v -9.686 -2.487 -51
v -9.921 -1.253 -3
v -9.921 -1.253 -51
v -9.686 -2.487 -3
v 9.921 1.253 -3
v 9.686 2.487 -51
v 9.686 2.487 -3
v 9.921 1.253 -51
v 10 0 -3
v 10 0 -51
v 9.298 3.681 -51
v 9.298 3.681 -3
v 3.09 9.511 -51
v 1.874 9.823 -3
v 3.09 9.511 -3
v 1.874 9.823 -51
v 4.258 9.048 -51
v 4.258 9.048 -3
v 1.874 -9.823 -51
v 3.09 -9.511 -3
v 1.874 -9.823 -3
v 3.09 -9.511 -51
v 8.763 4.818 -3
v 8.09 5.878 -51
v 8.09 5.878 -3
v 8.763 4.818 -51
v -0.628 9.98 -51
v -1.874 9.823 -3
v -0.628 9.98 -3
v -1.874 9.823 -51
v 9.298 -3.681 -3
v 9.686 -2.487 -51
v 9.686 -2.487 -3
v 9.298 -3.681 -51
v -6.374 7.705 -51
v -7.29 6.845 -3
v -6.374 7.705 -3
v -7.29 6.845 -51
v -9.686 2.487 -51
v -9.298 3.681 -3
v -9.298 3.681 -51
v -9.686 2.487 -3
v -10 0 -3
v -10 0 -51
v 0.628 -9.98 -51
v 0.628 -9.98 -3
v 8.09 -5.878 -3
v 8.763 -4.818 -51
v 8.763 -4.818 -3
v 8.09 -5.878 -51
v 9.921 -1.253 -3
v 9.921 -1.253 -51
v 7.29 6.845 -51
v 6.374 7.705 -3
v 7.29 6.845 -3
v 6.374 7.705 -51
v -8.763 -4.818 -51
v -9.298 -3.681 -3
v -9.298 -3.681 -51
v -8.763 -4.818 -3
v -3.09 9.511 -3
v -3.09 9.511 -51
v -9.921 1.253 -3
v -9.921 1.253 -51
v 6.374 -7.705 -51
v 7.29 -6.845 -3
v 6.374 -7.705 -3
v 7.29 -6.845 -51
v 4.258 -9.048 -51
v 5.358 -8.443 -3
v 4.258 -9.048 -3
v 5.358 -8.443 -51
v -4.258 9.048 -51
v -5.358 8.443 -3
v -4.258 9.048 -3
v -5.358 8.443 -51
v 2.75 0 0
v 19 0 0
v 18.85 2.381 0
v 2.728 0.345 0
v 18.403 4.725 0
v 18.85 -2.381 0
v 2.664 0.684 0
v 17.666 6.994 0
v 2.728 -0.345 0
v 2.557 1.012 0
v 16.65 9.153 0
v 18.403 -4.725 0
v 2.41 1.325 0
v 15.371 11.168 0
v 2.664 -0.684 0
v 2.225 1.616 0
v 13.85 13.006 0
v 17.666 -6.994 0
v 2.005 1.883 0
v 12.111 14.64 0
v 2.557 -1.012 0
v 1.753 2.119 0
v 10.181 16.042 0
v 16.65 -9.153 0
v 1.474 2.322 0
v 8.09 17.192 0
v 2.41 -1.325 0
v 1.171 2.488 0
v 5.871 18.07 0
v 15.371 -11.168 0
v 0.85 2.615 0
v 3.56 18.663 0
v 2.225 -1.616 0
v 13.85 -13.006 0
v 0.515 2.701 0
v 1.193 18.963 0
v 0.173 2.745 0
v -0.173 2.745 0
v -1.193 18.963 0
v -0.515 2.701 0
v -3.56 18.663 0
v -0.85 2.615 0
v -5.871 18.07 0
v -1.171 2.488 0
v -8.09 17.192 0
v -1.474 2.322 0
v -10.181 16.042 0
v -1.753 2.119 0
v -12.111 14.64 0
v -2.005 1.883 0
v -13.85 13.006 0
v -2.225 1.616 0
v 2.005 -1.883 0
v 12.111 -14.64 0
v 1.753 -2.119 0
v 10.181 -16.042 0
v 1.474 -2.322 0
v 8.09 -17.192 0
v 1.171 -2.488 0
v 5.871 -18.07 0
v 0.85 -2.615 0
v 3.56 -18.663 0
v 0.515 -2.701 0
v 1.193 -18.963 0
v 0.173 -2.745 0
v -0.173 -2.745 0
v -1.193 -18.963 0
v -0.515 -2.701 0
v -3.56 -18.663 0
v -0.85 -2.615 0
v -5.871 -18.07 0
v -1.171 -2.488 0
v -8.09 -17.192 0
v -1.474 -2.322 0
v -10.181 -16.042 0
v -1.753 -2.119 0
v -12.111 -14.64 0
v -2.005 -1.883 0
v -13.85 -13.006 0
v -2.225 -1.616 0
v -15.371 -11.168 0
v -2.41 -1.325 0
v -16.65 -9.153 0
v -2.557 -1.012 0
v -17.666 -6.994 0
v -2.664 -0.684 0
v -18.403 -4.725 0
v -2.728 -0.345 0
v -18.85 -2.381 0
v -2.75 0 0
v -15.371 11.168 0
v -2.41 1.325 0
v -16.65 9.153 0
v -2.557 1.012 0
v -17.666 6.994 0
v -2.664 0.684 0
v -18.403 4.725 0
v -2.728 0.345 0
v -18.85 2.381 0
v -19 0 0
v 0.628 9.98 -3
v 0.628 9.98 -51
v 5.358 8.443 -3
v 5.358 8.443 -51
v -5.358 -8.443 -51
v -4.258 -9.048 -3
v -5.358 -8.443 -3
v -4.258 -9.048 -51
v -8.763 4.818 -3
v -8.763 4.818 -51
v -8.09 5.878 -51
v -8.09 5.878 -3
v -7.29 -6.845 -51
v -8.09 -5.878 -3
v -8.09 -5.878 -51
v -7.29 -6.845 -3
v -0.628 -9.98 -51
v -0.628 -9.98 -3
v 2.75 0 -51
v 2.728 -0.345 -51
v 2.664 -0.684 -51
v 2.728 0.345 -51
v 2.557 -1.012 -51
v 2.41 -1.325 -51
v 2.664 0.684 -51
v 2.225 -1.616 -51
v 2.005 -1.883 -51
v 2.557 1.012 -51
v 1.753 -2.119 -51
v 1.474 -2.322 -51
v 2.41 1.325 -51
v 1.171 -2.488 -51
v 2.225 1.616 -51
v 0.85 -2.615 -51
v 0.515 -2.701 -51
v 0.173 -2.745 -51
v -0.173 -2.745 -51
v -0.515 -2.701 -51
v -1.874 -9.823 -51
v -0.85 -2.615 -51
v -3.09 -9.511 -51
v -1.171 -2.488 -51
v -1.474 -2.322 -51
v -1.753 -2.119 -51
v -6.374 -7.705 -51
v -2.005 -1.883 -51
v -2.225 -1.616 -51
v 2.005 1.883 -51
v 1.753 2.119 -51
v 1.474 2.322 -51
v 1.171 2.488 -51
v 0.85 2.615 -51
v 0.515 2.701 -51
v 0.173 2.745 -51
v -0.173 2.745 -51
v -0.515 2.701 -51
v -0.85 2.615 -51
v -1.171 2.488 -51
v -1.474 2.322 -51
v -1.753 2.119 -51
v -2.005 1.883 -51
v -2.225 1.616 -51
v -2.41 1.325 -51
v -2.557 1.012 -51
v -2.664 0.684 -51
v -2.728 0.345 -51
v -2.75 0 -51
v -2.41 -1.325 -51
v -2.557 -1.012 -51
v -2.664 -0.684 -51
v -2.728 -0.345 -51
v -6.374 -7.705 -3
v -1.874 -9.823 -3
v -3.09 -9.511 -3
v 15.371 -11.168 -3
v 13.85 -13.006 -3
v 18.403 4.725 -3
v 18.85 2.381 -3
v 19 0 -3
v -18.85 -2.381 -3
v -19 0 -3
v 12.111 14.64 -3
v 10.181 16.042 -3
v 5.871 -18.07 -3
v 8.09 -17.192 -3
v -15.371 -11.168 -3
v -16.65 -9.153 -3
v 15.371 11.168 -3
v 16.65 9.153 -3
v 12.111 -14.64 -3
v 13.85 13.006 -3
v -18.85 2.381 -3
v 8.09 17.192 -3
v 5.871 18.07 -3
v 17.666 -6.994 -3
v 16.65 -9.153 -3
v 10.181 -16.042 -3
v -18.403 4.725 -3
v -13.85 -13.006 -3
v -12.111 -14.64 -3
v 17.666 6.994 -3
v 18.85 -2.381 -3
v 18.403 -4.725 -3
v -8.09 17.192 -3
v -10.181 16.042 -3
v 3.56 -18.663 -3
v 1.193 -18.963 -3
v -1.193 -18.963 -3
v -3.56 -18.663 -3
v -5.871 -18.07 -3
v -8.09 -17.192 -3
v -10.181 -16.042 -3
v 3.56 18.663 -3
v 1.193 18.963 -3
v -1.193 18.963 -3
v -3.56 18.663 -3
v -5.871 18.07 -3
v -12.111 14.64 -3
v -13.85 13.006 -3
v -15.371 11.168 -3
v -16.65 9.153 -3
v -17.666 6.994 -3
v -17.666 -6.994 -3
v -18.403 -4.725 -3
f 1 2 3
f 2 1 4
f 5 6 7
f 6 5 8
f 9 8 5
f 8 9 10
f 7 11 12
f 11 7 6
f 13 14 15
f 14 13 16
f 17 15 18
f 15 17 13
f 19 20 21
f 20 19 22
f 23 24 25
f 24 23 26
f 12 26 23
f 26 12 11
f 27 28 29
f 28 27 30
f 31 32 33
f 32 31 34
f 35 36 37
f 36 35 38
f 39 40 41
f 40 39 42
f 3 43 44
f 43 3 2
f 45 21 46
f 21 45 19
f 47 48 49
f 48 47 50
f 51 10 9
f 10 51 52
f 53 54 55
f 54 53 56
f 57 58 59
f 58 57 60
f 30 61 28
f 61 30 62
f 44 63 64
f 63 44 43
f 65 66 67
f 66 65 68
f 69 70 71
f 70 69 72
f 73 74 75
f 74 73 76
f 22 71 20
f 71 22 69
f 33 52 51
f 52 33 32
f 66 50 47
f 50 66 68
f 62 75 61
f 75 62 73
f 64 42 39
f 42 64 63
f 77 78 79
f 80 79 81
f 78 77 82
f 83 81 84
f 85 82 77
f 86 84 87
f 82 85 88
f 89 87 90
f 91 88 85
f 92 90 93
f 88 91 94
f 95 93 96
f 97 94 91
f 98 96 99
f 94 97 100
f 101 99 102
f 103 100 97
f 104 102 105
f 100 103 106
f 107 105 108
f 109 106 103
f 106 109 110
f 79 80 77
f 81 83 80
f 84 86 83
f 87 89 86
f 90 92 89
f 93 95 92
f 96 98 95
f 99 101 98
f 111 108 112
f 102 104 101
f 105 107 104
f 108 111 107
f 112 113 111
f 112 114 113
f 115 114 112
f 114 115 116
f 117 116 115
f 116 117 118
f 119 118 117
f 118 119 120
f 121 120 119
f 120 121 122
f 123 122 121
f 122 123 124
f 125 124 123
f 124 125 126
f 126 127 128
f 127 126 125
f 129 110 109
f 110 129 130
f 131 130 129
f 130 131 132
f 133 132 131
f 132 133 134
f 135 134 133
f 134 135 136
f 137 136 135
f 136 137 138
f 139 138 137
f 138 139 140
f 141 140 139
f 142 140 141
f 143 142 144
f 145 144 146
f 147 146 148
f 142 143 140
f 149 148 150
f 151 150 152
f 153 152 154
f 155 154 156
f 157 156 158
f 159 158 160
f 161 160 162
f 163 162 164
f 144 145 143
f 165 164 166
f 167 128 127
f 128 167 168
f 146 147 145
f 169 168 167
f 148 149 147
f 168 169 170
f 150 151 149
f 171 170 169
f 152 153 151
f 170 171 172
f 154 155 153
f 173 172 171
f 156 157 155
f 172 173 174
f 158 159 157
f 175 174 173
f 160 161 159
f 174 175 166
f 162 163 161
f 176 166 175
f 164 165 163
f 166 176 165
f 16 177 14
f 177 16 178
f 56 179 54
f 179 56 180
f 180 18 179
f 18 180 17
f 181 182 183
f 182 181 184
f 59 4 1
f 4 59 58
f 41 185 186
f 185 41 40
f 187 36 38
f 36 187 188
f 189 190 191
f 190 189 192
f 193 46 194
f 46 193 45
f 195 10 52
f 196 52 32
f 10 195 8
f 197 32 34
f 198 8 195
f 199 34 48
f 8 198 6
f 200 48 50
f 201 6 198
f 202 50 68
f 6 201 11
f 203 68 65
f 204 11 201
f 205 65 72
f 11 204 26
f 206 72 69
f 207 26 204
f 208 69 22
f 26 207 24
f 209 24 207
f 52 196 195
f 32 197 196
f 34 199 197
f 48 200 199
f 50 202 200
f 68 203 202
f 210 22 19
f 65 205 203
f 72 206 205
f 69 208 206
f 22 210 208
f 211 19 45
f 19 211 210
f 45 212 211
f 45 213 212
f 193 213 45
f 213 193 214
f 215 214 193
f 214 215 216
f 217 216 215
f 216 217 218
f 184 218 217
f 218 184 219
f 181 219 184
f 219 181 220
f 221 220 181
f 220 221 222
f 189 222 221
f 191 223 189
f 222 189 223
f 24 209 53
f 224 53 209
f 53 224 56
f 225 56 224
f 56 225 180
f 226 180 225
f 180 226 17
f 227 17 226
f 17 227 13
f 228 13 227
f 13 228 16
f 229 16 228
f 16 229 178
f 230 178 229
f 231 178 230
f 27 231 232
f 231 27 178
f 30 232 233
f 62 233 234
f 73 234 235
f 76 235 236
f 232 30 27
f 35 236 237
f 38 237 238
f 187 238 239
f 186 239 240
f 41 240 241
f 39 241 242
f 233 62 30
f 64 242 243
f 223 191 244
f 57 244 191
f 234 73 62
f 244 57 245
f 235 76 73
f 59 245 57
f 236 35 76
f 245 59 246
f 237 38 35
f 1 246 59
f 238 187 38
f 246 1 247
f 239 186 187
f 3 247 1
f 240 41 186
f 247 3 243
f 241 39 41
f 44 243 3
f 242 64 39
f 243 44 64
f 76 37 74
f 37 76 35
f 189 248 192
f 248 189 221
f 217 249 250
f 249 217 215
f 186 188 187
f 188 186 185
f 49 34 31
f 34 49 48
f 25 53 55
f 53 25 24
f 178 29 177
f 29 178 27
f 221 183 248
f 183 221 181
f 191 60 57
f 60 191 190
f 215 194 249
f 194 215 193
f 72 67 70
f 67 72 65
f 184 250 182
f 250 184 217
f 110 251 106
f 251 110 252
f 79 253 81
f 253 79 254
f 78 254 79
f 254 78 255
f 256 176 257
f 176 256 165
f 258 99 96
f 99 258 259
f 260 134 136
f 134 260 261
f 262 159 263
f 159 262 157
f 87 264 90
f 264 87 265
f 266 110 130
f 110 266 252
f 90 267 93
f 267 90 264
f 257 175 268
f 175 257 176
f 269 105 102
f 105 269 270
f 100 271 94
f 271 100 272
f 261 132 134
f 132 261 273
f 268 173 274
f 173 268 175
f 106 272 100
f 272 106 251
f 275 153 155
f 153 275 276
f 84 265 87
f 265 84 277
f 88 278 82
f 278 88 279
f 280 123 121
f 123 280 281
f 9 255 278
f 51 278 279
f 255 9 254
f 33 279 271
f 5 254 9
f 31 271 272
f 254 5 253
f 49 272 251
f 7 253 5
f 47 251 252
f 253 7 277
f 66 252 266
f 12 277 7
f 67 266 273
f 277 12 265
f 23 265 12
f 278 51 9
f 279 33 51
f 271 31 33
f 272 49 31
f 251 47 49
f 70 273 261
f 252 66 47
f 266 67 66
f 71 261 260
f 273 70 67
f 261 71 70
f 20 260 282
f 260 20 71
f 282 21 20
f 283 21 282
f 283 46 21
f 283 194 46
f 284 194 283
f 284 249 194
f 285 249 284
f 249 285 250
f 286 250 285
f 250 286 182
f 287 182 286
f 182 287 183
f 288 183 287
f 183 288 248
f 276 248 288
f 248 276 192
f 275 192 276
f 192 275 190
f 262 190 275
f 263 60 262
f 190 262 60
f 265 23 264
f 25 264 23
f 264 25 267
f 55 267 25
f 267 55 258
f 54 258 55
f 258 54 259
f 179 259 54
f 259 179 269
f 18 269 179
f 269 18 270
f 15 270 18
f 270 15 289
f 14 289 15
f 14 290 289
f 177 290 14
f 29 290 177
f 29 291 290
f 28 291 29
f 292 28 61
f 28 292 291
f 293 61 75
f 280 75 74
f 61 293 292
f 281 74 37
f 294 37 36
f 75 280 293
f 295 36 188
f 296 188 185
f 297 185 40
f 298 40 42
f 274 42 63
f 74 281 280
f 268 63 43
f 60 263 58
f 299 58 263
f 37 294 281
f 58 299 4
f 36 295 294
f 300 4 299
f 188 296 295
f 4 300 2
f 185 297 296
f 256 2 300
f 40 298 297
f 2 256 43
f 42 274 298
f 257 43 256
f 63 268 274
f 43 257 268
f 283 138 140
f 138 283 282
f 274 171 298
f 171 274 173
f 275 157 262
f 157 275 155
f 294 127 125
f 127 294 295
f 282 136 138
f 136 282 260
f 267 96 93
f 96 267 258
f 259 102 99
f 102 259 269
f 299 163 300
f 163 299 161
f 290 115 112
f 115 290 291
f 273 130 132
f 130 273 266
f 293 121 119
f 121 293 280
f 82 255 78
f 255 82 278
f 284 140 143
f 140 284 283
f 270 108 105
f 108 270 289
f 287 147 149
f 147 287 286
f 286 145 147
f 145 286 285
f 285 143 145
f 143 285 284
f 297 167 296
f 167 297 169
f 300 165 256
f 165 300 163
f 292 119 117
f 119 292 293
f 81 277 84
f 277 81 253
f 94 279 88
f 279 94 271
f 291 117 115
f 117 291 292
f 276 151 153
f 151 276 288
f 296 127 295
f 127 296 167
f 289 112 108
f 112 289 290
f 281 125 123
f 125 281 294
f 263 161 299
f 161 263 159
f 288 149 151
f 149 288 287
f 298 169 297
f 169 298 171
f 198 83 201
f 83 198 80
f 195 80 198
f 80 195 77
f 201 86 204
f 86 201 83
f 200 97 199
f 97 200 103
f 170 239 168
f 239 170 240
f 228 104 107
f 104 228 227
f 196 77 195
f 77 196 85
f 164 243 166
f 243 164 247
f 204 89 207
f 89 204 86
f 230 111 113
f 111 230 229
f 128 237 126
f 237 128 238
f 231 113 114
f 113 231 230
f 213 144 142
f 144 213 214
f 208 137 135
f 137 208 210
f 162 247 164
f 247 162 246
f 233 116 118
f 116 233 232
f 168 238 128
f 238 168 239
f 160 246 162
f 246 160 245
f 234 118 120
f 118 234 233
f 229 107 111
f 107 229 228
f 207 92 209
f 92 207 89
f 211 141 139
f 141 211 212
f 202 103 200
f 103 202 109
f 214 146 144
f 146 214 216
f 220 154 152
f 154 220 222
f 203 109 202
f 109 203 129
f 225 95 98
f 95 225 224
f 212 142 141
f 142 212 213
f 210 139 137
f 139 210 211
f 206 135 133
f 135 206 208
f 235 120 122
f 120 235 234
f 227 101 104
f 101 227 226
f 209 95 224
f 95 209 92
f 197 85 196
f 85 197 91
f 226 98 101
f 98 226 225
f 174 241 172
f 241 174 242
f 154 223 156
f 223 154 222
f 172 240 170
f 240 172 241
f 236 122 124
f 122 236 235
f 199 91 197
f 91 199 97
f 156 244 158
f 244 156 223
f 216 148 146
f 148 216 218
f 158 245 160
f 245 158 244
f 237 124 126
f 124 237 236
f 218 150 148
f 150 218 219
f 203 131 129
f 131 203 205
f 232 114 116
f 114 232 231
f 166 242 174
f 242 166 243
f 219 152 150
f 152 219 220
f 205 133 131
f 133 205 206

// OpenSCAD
$fn = 50;


difference() {
	union() {
		translate(v = [0, 0, -51.0000000000]) {
			cylinder(h = 51, r = 10.0000000000);
		}
		translate(v = [0, 0, -3.0000000000]) {
			cylinder(h = 3, r = 19.0000000000);
		}
	}
	union() {
		#translate(v = [0, 0, -51]) {
			cylinder(h = 51, r = 2.7500000000);
		}
	}
}
